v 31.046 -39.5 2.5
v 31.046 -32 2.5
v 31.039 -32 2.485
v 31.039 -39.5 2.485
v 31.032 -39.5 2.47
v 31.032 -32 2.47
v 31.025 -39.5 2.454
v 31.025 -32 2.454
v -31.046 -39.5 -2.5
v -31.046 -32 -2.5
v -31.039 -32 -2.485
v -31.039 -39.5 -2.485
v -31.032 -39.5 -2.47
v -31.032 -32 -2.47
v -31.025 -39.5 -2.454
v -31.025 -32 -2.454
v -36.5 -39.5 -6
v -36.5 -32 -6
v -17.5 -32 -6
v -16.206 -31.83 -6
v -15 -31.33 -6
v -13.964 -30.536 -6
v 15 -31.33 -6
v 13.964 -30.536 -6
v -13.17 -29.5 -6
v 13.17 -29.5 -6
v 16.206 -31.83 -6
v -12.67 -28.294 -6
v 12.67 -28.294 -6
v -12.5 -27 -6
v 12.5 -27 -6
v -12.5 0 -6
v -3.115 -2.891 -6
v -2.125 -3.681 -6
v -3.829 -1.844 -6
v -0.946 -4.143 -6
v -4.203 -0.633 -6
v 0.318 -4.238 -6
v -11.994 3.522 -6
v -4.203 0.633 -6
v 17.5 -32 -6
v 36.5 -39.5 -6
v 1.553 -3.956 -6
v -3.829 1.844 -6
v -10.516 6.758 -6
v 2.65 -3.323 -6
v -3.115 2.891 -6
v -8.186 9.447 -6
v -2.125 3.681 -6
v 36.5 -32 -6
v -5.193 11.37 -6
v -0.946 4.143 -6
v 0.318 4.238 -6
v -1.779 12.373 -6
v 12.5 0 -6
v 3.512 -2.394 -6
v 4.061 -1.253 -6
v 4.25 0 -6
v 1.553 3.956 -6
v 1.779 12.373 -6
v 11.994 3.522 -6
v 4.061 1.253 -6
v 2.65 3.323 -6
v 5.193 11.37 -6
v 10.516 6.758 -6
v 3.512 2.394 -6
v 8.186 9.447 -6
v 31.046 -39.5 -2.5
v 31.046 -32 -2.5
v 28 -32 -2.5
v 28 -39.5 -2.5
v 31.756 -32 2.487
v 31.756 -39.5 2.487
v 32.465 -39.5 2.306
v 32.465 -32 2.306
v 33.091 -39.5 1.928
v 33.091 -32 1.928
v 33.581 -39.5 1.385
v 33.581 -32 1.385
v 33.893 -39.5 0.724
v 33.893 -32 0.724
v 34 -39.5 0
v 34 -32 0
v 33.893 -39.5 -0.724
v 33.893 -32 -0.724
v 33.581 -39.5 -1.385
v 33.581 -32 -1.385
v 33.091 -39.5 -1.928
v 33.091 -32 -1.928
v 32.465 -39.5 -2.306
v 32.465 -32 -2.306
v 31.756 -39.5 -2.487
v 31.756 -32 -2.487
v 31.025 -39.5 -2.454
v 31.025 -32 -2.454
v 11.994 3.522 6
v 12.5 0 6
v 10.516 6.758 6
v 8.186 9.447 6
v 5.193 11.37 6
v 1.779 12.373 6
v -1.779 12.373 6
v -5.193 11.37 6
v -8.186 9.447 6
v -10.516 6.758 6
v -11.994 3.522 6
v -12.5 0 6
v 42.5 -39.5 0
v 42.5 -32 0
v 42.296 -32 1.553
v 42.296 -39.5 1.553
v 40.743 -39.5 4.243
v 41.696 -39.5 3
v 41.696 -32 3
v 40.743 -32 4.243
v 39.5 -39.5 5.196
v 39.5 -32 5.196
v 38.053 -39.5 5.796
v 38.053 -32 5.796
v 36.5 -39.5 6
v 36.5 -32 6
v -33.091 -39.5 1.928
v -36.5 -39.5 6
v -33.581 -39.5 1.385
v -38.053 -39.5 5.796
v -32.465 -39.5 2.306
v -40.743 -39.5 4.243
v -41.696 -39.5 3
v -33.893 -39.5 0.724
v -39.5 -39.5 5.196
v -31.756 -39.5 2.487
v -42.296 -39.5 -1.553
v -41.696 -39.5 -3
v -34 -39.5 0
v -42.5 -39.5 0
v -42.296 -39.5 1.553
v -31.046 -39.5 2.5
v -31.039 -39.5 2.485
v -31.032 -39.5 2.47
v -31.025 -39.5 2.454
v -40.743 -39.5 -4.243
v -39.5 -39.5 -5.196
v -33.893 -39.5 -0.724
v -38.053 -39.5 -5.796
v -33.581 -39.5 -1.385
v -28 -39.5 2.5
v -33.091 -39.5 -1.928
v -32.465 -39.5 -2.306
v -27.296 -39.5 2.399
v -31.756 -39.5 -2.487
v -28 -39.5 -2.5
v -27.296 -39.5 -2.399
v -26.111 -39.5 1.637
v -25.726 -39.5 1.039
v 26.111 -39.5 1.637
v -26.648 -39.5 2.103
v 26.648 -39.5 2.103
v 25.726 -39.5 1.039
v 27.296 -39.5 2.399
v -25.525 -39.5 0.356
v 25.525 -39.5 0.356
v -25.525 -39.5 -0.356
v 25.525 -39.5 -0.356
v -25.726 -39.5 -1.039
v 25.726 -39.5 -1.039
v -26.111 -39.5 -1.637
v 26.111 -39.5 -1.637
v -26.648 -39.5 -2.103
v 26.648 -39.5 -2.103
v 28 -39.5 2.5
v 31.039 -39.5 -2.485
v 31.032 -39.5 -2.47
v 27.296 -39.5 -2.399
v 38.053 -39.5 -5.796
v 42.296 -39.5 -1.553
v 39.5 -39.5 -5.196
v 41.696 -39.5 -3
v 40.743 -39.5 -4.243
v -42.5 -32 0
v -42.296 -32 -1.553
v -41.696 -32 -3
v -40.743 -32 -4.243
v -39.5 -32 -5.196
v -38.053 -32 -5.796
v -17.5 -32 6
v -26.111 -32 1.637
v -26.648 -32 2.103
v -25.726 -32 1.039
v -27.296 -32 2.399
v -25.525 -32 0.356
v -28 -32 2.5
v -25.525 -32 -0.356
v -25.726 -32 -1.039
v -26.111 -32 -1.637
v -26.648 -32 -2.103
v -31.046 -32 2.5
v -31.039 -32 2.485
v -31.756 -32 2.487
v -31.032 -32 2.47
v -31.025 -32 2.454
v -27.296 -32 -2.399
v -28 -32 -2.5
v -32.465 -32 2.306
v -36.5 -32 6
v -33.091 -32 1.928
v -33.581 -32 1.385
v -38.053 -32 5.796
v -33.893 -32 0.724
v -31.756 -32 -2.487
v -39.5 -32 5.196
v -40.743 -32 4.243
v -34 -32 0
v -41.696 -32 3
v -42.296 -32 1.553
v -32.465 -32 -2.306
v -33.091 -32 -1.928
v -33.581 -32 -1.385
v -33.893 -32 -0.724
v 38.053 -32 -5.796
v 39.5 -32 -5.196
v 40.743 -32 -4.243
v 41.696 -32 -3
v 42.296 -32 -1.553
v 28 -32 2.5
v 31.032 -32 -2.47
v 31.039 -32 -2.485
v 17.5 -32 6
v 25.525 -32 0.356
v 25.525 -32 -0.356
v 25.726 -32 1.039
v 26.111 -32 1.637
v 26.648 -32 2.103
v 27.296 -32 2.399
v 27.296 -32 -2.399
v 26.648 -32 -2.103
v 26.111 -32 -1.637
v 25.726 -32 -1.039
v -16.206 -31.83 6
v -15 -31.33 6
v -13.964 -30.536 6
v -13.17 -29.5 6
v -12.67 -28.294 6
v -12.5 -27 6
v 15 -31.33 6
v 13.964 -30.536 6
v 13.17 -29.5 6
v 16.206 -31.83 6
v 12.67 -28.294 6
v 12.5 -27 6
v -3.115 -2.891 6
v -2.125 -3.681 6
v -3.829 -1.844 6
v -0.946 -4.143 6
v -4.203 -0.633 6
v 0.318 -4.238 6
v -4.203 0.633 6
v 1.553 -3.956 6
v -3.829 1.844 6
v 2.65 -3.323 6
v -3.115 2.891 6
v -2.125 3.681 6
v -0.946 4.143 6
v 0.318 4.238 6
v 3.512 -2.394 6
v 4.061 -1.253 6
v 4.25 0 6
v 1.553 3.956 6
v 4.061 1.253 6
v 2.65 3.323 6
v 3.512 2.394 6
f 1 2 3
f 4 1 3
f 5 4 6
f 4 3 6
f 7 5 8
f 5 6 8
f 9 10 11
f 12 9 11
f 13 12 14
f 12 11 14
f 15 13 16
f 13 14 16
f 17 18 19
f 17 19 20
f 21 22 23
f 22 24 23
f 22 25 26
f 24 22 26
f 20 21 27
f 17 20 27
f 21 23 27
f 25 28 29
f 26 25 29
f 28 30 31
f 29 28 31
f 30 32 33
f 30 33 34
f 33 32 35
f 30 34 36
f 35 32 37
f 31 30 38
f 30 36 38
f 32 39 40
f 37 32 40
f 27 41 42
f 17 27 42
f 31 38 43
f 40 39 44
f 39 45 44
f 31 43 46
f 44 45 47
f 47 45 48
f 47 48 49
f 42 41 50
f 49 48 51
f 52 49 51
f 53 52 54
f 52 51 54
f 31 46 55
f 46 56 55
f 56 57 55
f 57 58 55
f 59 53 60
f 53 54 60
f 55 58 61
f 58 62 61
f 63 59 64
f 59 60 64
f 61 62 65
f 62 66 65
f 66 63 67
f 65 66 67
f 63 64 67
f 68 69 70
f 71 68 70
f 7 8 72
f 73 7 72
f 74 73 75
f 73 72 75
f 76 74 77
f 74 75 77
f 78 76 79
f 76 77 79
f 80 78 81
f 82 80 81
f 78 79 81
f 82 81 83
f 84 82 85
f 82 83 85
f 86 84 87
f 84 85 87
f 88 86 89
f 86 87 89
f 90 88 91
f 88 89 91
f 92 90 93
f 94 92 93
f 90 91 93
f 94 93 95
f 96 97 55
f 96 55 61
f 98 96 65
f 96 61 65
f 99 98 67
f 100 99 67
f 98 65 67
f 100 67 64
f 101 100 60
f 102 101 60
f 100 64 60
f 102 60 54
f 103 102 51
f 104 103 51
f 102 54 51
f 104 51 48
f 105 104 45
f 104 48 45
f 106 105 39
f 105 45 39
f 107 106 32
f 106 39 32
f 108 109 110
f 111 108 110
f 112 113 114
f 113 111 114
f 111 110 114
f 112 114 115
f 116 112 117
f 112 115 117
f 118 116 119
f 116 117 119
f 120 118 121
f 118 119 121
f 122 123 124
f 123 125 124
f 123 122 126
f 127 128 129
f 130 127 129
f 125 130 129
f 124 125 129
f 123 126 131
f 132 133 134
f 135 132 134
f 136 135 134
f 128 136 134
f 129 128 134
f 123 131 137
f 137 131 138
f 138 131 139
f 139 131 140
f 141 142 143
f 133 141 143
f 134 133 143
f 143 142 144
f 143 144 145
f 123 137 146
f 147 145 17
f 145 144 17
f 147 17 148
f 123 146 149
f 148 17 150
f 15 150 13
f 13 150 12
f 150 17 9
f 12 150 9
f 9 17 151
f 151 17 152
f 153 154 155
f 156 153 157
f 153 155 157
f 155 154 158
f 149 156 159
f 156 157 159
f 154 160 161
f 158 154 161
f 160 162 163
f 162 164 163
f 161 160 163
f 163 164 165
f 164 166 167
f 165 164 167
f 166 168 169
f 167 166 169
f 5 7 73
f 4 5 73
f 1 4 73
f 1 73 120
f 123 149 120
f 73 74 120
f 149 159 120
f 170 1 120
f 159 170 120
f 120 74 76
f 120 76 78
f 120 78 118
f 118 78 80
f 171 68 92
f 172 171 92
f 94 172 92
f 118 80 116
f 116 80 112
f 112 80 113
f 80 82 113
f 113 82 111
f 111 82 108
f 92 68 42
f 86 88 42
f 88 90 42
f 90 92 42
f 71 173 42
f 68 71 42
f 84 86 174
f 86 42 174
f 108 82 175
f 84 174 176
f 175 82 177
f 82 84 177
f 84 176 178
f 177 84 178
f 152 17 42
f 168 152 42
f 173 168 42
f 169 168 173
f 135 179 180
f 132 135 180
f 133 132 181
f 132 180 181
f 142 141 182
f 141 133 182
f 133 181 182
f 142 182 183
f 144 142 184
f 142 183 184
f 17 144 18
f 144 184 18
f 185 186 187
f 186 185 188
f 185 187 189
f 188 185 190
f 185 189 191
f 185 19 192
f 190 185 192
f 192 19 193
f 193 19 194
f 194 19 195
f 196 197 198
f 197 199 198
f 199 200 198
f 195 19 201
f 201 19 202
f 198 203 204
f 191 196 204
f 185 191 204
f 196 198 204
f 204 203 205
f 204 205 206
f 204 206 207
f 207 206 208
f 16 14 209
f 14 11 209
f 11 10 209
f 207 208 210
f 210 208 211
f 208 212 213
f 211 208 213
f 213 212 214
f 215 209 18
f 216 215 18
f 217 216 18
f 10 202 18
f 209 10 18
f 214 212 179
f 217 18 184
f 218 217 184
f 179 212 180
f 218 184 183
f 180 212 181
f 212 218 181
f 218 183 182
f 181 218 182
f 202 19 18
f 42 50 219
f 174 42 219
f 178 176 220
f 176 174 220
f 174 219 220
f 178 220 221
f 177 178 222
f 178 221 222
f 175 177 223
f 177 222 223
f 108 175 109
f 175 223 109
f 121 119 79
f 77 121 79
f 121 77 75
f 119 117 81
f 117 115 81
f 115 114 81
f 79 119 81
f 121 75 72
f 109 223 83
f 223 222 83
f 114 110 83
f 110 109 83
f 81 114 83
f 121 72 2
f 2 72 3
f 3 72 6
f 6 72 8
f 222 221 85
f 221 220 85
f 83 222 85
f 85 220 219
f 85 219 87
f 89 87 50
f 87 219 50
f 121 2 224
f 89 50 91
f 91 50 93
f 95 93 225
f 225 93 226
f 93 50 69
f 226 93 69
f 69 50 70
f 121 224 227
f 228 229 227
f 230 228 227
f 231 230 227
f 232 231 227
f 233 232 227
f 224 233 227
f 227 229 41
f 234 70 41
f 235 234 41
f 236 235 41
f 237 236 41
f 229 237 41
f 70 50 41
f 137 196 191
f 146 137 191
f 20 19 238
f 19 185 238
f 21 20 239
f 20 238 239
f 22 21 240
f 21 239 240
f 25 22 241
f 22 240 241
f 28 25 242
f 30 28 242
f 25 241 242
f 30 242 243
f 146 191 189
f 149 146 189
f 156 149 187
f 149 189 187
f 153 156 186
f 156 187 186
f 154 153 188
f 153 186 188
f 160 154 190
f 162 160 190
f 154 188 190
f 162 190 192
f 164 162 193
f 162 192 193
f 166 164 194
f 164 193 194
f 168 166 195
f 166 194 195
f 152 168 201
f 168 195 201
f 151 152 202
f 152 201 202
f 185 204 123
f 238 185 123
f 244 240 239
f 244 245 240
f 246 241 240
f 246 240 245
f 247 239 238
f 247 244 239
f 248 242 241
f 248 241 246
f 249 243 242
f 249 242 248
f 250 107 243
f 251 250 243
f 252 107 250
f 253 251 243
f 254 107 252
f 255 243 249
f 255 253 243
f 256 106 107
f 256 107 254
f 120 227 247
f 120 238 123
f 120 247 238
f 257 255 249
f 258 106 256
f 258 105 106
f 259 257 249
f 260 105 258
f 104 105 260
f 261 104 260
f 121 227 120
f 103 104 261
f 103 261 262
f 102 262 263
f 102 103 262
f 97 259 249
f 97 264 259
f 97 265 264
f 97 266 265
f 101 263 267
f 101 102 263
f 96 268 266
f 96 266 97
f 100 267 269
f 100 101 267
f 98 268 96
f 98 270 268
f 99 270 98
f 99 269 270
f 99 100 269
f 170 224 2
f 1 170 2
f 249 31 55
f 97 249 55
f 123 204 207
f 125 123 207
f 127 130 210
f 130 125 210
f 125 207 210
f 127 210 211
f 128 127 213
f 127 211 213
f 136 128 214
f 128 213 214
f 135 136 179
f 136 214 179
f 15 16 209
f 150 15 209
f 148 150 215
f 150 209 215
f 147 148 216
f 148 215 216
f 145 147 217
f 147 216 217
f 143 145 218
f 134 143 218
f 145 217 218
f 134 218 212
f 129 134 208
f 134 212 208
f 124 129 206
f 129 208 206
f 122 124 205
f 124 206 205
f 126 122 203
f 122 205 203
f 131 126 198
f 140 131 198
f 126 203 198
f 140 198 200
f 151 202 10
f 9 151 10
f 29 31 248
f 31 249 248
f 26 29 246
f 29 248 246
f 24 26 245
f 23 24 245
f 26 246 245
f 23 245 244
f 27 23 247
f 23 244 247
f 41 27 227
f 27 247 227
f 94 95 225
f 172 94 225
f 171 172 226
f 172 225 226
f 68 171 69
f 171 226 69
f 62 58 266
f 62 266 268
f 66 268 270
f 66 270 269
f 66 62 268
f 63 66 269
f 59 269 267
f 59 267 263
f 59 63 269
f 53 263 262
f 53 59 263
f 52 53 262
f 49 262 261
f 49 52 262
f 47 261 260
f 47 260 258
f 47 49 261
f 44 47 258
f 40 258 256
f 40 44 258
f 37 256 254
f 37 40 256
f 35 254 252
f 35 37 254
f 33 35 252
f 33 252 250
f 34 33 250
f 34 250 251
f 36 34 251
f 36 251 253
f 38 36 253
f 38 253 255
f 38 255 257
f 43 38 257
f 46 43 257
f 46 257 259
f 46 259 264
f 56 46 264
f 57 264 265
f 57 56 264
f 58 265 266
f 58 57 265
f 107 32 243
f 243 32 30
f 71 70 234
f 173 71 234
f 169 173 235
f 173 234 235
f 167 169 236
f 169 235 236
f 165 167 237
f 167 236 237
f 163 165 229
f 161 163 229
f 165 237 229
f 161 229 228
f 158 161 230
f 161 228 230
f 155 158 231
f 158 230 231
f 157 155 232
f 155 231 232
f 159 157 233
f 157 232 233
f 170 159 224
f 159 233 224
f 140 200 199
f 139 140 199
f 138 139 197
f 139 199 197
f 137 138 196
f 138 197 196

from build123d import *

# Parameters (mm, degrees)
BOSS_EXTRUDE1_DEPTH      = 6
BOSS_EXTRUDE1_DEPTH_BACK = 6
SKETCH1_R                = 4.25
CUT_EXTRUDE1_DEPTH       = 59.330952332
FILLET1_R                = 5


with BuildPart() as part:
    # Sketch1 → Boss-Extrude1 (new, two sides: drawn at the far end of the back side and taken through both)
    with BuildSketch(Plane.XY.offset(-BOSS_EXTRUDE1_DEPTH_BACK)):
        with BuildLine():
            Line((-42.5, -32), (-42.5, -39.5))
            Line((-42.5, -39.5), (42.5, -39.5))
            Line((42.5, -39.5), (42.5, -32))
            Line((42.5, -32), (12.5, -32))
            Line((12.5, -32), (12.5, 0))
            ThreePointArc((12.5, 0), (0, 12.5), (-12.5, 0))
            Line((-12.5, 0), (-12.5, -32))
            Line((-12.5, -32), (-42.5, -32))
        make_face()
        Circle(SKETCH1_R, mode=Mode.SUBTRACT)
    extrude(amount=BOSS_EXTRUDE1_DEPTH + BOSS_EXTRUDE1_DEPTH_BACK)

    # Sketch4 → Cut-Extrude1 (cut, through all)
    with BuildSketch(Plane(origin=(0, 0, 0), x_dir=(1, 0, 0), z_dir=(0, 1, 0))):
        with BuildLine():
            ThreePointArc((31.025, -2.454460226), (34, 0), (31.025, 2.454460226))
            ThreePointArc((31.025, 2.454460226), (31.035274533, 2.477251617), (31.045643943, 2.5))
            Line((31.045643943, 2.5), (28, 2.5))
            ThreePointArc((28, 2.5), (25.5, 0), (28, -2.5))
            Line((28, -2.5), (31.045643943, -2.5))
            ThreePointArc((31.045643943, -2.5), (31.035274533, -2.477251617), (31.025, -2.454460226))
        make_face()
        with BuildLine():
            ThreePointArc((42.5, 0), (40.742640687, -4.242640687), (36.5, -6))
            Line((36.5, -6), (42.5, -6))
            Line((42.5, -6), (42.5, 0))
        make_face()
        with BuildLine():
            Line((-42.5, -6), (-36.5, -6))
            ThreePointArc((-36.5, -6), (-40.742640687, -4.242640687), (-42.5, 0))
            Line((-42.5, 0), (-42.5, -6))
        make_face()
        with BuildLine():
            ThreePointArc((36.5, 6), (40.742640687, 4.242640687), (42.5, 0))
            Line((42.5, 0), (42.5, 6))
            Line((42.5, 6), (36.5, 6))
        make_face()
        with BuildLine():
            Line((-42.5, 6), (-42.5, 0))
            ThreePointArc((-42.5, 0), (-40.742640668, 4.242640706), (-36.499999946, 6))
            Line((-36.499999946, 6), (-42.5, 6))
        make_face()
        with BuildLine():
            ThreePointArc((-31.025, -2.454460226), (-31.035274533, -2.477251617), (-31.045643943, -2.5))
            Line((-31.045643943, -2.5), (-28, -2.5))
            ThreePointArc((-28, -2.5), (-25.5, 0), (-28, 2.5))
            Line((-28, 2.5), (-31.045643943, 2.5))
            ThreePointArc((-31.045643943, 2.5), (-31.035274533, 2.477251617), (-31.025, 2.454460226))
            ThreePointArc((-31.025, 2.454460226), (-34, 0), (-31.025, -2.454460226))
        make_face()
    extrude(amount=-CUT_EXTRUDE1_DEPTH, mode=Mode.SUBTRACT)

    # Fillet1
    fillet1_edges = [part.edges().sort_by_distance(p)[0] for p in [
        (-12.5, -32, 0),
        (12.5, -32, 0),
    ]]
    fillet(fillet1_edges, radius=FILLET1_R)


solid = part.part
